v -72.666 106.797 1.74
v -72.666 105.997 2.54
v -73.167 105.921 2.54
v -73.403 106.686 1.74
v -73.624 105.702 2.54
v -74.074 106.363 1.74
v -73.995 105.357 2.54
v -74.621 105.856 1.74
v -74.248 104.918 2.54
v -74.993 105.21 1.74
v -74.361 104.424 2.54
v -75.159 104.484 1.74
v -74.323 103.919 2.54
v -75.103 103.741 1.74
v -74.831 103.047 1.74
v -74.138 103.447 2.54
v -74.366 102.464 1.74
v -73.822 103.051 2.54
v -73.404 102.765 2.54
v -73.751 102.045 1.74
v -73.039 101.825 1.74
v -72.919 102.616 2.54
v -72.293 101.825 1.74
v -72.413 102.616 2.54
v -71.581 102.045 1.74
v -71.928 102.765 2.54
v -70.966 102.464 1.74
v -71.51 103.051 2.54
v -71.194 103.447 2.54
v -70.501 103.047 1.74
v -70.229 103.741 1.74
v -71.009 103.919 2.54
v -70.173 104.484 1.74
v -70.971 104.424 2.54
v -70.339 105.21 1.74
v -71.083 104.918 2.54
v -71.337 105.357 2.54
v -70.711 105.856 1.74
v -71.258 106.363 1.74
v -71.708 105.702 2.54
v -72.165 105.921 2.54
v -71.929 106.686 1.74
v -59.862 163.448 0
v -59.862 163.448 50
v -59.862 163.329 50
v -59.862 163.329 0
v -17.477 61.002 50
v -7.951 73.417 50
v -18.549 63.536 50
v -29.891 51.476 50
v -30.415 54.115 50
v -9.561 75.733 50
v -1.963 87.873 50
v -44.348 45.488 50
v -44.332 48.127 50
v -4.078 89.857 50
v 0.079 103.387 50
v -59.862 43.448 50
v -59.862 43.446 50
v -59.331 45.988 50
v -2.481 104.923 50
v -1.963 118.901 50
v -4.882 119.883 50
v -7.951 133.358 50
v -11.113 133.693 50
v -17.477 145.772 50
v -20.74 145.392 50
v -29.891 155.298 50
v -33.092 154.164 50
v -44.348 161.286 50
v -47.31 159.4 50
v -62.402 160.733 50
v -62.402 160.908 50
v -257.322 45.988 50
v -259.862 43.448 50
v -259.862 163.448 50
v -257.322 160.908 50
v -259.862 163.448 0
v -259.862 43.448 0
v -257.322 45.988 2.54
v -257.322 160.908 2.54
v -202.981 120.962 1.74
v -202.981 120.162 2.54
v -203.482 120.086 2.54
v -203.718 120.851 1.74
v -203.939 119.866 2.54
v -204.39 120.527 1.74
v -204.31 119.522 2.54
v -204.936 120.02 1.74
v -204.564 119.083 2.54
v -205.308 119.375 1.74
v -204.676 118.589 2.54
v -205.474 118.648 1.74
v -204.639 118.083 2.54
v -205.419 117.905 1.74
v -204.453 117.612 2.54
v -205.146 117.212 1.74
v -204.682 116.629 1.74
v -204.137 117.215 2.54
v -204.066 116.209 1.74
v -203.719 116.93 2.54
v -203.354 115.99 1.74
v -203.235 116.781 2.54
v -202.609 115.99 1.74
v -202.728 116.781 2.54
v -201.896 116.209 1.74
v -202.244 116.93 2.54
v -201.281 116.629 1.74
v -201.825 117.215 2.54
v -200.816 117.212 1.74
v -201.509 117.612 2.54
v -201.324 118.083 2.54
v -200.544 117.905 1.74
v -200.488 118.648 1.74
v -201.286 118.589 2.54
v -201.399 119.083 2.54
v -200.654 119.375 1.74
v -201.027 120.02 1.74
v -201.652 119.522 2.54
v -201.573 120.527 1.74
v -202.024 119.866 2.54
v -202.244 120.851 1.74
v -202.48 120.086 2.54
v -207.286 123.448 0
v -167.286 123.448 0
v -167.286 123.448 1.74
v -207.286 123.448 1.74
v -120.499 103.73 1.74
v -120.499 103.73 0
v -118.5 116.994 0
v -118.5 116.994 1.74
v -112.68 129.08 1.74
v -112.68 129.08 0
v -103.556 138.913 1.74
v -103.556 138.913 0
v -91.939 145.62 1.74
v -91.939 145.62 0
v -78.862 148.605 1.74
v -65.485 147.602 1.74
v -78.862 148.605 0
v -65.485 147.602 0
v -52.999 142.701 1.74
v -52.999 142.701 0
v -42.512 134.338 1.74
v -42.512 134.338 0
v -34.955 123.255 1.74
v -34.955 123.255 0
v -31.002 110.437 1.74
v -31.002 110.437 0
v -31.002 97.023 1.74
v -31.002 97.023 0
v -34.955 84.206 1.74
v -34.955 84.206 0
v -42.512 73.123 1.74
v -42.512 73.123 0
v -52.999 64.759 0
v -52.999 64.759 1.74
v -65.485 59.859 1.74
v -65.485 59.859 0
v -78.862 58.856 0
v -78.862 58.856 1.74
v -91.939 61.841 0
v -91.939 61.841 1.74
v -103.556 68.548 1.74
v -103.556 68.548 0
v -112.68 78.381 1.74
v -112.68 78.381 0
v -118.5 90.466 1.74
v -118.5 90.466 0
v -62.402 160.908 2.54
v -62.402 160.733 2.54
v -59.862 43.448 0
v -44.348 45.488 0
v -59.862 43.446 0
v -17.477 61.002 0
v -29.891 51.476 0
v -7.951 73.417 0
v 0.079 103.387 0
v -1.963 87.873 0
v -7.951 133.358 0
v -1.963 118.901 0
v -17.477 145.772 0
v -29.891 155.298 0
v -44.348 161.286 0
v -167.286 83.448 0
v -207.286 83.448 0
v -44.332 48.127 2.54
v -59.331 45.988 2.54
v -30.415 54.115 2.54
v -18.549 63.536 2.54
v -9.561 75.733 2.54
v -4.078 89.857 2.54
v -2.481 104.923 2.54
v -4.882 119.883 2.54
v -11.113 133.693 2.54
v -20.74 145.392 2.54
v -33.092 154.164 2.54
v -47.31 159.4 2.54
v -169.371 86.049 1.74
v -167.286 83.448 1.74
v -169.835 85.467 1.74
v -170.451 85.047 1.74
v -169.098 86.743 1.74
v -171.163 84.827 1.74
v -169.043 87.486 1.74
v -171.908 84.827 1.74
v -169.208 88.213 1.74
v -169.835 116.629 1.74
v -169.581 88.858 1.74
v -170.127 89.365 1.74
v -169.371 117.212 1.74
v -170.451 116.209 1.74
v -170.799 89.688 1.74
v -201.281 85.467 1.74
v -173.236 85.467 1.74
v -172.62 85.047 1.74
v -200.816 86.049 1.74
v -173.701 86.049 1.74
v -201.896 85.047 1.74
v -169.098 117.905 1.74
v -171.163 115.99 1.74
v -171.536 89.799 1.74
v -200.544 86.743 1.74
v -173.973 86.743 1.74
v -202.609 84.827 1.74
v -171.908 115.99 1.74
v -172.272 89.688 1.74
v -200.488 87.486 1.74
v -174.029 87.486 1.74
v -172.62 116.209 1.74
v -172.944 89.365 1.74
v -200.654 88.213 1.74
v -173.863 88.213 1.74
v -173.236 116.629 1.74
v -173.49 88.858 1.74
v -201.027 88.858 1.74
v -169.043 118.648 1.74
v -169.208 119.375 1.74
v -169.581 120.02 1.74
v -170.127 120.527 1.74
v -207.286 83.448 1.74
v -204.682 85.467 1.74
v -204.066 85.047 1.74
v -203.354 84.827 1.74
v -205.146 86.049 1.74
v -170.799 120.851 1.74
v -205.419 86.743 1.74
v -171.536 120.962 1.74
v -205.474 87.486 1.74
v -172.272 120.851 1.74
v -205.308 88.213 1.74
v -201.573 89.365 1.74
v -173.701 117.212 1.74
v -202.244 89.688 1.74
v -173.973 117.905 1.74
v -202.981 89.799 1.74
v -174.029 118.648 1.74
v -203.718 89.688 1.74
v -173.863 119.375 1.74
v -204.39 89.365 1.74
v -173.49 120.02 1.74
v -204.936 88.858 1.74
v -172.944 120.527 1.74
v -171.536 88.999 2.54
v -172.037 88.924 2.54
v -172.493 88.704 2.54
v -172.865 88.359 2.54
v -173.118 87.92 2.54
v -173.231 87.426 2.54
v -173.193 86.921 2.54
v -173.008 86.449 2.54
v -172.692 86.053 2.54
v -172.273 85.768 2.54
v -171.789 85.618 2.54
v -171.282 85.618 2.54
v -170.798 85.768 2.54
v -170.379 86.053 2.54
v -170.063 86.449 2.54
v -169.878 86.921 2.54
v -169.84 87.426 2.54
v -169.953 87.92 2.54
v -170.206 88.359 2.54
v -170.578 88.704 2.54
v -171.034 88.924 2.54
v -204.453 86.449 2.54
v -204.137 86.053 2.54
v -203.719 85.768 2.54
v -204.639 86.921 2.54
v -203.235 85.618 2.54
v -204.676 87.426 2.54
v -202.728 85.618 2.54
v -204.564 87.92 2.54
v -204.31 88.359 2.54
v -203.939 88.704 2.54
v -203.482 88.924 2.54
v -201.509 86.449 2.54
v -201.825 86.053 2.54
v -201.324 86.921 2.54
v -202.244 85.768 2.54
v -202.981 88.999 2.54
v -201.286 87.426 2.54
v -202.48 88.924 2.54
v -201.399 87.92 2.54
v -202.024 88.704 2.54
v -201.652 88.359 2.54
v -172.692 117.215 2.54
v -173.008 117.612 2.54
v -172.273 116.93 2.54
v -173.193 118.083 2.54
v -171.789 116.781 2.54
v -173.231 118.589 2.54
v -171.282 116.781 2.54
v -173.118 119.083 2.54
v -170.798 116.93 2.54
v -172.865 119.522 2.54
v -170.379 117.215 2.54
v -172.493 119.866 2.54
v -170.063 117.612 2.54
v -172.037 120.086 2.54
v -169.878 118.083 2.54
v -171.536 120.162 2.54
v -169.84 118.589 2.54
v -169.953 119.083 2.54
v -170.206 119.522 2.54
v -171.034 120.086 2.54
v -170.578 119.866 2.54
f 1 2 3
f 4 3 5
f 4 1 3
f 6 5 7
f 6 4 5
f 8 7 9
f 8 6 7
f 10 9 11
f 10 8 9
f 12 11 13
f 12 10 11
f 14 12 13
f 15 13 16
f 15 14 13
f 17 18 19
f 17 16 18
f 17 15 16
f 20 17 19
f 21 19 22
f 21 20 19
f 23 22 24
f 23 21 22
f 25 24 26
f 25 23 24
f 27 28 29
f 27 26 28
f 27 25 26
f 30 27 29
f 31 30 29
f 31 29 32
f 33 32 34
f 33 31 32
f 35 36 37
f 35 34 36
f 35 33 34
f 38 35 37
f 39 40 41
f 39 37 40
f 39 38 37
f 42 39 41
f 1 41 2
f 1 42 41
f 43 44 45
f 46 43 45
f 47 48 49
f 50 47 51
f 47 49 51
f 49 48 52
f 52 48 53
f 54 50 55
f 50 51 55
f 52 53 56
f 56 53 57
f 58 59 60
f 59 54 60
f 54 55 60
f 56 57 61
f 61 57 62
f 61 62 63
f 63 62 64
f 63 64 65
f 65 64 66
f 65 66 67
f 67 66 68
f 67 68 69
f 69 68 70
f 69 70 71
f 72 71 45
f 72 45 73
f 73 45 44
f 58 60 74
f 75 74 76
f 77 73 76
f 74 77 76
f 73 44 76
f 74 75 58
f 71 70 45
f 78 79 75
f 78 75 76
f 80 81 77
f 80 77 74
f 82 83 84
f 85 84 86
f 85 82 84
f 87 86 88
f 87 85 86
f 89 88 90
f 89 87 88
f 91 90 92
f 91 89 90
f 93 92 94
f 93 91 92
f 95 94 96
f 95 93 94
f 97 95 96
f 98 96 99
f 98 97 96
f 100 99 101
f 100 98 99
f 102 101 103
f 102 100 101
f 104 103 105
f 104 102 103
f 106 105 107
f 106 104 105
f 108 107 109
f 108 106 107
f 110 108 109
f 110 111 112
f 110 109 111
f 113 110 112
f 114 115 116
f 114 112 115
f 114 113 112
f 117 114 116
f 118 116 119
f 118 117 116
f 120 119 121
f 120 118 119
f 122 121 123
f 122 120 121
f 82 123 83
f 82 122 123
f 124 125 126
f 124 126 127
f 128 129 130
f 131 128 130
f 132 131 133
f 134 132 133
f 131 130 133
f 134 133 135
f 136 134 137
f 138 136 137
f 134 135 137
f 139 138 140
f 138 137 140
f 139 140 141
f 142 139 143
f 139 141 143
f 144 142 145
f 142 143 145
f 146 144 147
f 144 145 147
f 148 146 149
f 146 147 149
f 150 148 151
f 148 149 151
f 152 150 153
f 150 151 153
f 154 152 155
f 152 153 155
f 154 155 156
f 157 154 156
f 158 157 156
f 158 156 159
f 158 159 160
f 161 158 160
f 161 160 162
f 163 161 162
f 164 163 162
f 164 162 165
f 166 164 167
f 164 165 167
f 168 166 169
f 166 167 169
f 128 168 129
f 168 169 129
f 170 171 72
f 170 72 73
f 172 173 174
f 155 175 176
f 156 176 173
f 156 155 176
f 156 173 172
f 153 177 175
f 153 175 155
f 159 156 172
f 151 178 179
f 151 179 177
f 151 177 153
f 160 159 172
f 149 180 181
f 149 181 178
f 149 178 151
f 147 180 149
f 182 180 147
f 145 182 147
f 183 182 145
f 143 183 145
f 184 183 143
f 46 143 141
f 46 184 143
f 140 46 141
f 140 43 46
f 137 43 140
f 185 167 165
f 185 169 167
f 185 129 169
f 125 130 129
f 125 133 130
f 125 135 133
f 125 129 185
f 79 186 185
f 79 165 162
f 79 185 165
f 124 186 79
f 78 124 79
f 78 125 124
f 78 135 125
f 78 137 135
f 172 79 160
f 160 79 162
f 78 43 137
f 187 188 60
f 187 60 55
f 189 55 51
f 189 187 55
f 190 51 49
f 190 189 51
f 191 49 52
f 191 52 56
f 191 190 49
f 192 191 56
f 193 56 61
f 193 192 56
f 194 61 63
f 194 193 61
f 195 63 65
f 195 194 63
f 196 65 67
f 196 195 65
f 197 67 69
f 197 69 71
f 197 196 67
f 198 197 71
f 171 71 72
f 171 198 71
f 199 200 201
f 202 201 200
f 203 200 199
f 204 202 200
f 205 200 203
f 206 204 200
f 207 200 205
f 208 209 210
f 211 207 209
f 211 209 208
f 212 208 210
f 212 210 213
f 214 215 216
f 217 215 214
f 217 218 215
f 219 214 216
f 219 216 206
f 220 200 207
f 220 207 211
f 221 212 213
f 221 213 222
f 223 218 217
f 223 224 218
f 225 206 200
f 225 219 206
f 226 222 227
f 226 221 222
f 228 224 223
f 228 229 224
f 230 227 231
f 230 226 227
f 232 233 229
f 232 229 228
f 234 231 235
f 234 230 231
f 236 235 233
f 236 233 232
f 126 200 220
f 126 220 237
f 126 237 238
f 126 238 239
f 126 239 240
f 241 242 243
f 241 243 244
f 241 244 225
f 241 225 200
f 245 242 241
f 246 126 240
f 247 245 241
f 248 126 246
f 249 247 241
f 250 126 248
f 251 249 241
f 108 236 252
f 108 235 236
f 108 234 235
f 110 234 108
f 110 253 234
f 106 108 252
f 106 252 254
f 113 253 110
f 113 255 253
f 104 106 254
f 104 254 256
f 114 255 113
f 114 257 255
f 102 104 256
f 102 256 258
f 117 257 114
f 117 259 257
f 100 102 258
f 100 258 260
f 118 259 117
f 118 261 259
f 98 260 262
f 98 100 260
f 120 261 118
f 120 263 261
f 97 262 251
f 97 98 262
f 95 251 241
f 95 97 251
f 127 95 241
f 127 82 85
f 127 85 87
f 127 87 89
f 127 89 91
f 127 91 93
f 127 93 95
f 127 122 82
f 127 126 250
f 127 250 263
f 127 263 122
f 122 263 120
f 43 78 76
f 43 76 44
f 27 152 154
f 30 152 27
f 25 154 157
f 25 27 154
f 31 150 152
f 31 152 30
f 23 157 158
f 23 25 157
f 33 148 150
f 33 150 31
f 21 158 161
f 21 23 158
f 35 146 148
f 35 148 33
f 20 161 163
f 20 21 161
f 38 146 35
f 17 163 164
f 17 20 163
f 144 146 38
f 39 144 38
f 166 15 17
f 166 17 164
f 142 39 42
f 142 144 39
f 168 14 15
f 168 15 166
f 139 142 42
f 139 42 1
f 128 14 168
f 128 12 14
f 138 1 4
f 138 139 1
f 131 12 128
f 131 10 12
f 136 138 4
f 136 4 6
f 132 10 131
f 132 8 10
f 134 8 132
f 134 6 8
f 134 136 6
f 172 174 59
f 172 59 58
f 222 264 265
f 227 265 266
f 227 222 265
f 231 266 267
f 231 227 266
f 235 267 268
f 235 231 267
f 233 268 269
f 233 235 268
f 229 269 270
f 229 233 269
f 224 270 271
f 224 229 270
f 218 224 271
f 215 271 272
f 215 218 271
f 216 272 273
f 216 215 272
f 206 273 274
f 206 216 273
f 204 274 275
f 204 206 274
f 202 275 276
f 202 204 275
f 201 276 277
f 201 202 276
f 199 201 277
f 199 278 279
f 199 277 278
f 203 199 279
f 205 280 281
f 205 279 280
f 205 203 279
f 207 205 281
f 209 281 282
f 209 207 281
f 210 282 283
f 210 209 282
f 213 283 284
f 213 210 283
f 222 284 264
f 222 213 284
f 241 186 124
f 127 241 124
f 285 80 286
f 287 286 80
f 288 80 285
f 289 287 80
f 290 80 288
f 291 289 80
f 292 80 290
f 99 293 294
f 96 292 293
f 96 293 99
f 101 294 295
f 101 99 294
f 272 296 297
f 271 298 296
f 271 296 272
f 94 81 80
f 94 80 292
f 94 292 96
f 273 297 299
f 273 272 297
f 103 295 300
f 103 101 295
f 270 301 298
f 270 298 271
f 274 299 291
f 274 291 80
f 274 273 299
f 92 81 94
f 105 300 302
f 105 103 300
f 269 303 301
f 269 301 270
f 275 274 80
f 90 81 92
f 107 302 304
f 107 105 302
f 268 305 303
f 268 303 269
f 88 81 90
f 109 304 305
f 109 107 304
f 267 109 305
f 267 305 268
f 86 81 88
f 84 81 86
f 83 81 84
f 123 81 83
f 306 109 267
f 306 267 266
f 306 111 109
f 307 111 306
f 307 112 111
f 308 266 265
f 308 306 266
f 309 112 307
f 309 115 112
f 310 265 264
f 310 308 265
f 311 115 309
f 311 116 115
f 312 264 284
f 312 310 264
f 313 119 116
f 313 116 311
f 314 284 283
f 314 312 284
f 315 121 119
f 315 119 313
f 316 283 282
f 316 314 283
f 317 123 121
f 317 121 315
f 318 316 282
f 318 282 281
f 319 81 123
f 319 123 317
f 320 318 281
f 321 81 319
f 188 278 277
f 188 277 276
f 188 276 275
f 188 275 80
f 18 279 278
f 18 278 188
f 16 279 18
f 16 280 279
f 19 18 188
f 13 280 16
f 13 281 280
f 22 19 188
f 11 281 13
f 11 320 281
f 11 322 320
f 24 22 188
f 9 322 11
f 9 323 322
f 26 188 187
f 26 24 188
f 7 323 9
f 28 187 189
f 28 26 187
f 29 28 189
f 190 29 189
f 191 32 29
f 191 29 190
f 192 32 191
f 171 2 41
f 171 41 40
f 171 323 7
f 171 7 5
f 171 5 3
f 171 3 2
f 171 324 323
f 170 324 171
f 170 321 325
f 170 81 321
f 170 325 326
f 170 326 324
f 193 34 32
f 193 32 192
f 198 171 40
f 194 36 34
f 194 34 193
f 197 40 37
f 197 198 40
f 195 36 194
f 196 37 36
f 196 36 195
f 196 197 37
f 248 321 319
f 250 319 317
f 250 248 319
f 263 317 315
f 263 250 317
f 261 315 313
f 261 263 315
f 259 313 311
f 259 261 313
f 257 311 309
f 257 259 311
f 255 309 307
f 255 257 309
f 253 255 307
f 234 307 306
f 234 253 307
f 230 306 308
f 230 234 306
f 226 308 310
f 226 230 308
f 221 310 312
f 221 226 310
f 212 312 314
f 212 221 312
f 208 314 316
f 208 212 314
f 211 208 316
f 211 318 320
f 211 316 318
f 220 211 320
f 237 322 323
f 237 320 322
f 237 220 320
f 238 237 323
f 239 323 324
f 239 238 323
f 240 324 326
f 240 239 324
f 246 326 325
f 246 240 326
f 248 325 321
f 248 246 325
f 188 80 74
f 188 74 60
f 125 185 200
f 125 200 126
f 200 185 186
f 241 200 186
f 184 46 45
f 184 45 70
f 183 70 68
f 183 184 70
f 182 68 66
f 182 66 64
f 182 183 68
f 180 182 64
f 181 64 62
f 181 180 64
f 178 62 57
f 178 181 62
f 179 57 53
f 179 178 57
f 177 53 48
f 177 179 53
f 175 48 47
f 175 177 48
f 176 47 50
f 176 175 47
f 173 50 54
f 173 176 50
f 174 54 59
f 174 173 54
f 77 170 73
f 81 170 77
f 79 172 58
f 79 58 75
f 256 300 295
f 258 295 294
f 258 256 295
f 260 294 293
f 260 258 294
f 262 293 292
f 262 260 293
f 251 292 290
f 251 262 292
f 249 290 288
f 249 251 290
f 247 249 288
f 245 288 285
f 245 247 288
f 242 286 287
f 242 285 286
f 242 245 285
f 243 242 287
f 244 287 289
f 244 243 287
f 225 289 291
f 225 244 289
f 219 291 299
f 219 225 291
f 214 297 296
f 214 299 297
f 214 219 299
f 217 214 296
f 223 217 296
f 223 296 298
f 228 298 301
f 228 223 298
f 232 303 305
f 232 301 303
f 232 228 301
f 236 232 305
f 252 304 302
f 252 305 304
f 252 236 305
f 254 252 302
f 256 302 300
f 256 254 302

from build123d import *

# Parameters (mm, degrees)
BOSS_EXTRUDE1_DEPTH            = 50
SHELL1_START                   = 2.54
SHELL1_DEPTH                   = 47.46
SKETCH3_R                      = 45
CUT_EXTRUDE1_DEPTH             = 1.74
SKETCH4_W                      = 40
SKETCH4_H                      = 40
CUT_EXTRUDE2_DEPTH             = 1.74
F_1_0MM_DOWEL_HOLE1_AT_2_COUNT = 2
F_1_0MM_DOWEL_HOLE1_AT_2_PITCH = 99.87910309
F_1_0MM_DOWEL_HOLE1_AT_3_COUNT = 2
F_1_0MM_DOWEL_HOLE1_AT_3_PITCH = 131.082783866
F_1_0MM_DOWEL_HOLE1_AT_4_COUNT = 2
F_1_0MM_DOWEL_HOLE1_AT_4_PITCH = 131.419090104
F_1_0MM_DOWEL_HOLE1_AT_5_COUNT = 2
F_1_0MM_DOWEL_HOLE1_AT_5_PITCH = 100.320069037


# Read off the part's stored shape, not the designer's step: Shell1
with BuildPart() as part:
    # Sketch2 → Boss-Extrude1 (new body)
    with BuildSketch(Plane.XY):
        with BuildLine():
            Line((-59.862068966, 43.445816391), (-59.862068966, 43.448275862))
            Line((-59.862068966, 43.448275862), (-259.862068966, 43.448275862))
            Line((-259.862068966, 43.448275862), (-259.862068966, 163.448275862))
            Line((-259.862068966, 163.448275862), (-59.862068966, 163.448275862))
            Line((-59.862068966, 163.448275862), (-59.862068966, 163.328859089))
            ThreePointArc((-59.862068966, 163.328859089), (0.079347122, 103.38733774), (-59.862068966, 43.445816391))
        make_face()
    extrude(amount=BOSS_EXTRUDE1_DEPTH)

    # Shell1 outline → Shell1 (cut)
    with BuildSketch(Plane.XY.offset(SHELL1_START)):
        with BuildLine():
            Line((-257.322068966, 160.908275862), (-257.322068966, 45.988275862))
            Line((-257.322068966, 45.988275862), (-59.330809241, 45.988275862))
            ThreePointArc((-59.330809241, 45.988275862), (-2.481203762, 104.923202846), (-62.402068966, 160.732639099))
            Line((-62.402068966, 160.732639099), (-62.402068966, 160.908275862))
            Line((-62.402068966, 160.908275862), (-257.322068966, 160.908275862))
        make_face()
    extrude(amount=SHELL1_DEPTH, mode=Mode.SUBTRACT)

    # Sketch3 → Cut-Extrude1 (cut)
    with BuildSketch(Plane(origin=(0, 0, 0), x_dir=(-1, 0, 0), z_dir=(0, 0, -1))):
        with Locations((75.49891969, 103.730340091)):
            Circle(SKETCH3_R)
    extrude(amount=-CUT_EXTRUDE1_DEPTH, mode=Mode.SUBTRACT)

    # Sketch4 → Cut-Extrude2 (cut)
    with BuildSketch(Plane(origin=(0, 0, 0), x_dir=(-1, 0, 0), z_dir=(0, 0, -1))):
        with Locations((187.286164269, 103.448275862)):
            Rectangle(SKETCH4_W, SKETCH4_H)
    extrude(amount=-CUT_EXTRUDE2_DEPTH, mode=Mode.SUBTRACT)

    # Sketch8 → Ø1.0mm Dowel Hole1 (revolve, cut)
    with BuildSketch(Plane(origin=(-72.665980043, 104.296928021, 1.74), x_dir=(0, 1, 0), z_dir=(1, 0, 0))):
        Polygon((0, 0), (0, 1.57043031), (0.5, 1.27), (0.5, 2), (2.5, 0), align=None)
    f_1_0mm_dowel_hole1 = revolve(axis=Axis((-72.665980043, 104.296928021, -4.61), (0, 0, 1)), mode=Mode.SUBTRACT)

    # Ø1.0mm Dowel Hole1 at 2: Ø1.0mm Dowel Hole1 ×2
    with Locations(*[Vector(-0.9898926866452568, 0.1418184364821284, 0) * (i * F_1_0MM_DOWEL_HOLE1_AT_2_PITCH) for i in range(1, F_1_0MM_DOWEL_HOLE1_AT_2_COUNT)]):
        add(f_1_0mm_dowel_hole1, mode=Mode.SUBTRACT)

    # Ø1.0mm Dowel Hole1 at 3: Ø1.0mm Dowel Hole1 ×2
    with Locations(*[Vector(-0.9941444630694566, 0.10805918076841914, 0) * (i * F_1_0MM_DOWEL_HOLE1_AT_3_PITCH) for i in range(1, F_1_0MM_DOWEL_HOLE1_AT_3_COUNT)]):
        add(f_1_0mm_dowel_hole1, mode=Mode.SUBTRACT)

    # Ø1.0mm Dowel Hole1 at 4: Ø1.0mm Dowel Hole1 ×2
    with Locations(*[Vector(-0.9916004111862218, -0.12933918406776793, 0) * (i * F_1_0MM_DOWEL_HOLE1_AT_4_PITCH) for i in range(1, F_1_0MM_DOWEL_HOLE1_AT_4_COUNT)]):
        add(f_1_0mm_dowel_hole1, mode=Mode.SUBTRACT)

    # Ø1.0mm Dowel Hole1 at 5: Ø1.0mm Dowel Hole1 ×2
    with Locations(*[Vector(-0.9855415237113911, -0.16943407284436512, 0) * (i * F_1_0MM_DOWEL_HOLE1_AT_5_PITCH) for i in range(1, F_1_0MM_DOWEL_HOLE1_AT_5_COUNT)]):
        add(f_1_0mm_dowel_hole1, mode=Mode.SUBTRACT)


solid = part.part
